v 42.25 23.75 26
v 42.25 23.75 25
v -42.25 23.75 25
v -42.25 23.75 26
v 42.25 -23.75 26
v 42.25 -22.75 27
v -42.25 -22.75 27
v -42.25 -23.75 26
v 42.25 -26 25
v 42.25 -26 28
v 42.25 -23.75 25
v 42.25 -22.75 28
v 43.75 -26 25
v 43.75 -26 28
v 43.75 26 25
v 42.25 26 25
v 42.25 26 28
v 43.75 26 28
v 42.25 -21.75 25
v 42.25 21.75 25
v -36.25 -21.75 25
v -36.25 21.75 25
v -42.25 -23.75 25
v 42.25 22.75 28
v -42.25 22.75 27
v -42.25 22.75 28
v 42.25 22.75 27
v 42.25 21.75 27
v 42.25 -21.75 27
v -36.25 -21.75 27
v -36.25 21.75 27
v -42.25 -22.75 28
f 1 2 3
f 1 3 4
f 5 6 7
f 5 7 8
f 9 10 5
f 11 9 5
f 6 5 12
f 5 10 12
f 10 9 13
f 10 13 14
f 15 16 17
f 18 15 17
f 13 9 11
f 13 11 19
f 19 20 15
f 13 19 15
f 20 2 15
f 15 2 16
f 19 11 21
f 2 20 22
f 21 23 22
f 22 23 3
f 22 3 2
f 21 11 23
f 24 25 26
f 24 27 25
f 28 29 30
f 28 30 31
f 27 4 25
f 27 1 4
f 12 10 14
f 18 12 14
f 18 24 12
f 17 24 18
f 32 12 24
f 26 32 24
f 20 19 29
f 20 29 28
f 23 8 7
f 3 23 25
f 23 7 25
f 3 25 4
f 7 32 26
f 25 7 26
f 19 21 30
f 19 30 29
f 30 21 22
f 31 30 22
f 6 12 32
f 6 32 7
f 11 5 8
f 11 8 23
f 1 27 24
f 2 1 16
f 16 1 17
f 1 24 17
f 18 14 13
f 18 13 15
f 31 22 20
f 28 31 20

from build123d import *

# Parameters (mm, degrees)
PAD003003002_DEPTH = 42.25
SKETCH009_W        = 52
SKETCH009_H        = 3
PAD003003003_DEPTH = 1.5
SKETCH010_W        = 43.5
SKETCH010_H        = 78.5
POCKET002_DEPTH    = 2


with BuildPart() as part:
    # Sketch008 → Pad003003002 (new body, symmetric)
    with BuildSketch(Plane.YZ):
        Polygon((22.75, 28), (-22.75, 28), (-22.75, 27), (-23.75, 26), (-23.75, 25), (23.75, 25), (23.75, 26), (22.75, 27), align=None)
    extrude(amount=PAD003003002_DEPTH, both=True)

    # Sketch009 → Pad003003003 (new body)
    with BuildSketch(Plane.YZ.offset(42.25)):
        with Locations((0, 26.5)):
            Rectangle(SKETCH009_W, SKETCH009_H)
    extrude(amount=PAD003003003_DEPTH)

    # Sketch010 → Pocket002 (cut)
    with BuildSketch(Plane.YX.offset(-25)):
        with Locations((0, 3)):
            Rectangle(SKETCH010_W, SKETCH010_H)
    extrude(amount=-POCKET002_DEPTH, mode=Mode.SUBTRACT)


solid = part.part
